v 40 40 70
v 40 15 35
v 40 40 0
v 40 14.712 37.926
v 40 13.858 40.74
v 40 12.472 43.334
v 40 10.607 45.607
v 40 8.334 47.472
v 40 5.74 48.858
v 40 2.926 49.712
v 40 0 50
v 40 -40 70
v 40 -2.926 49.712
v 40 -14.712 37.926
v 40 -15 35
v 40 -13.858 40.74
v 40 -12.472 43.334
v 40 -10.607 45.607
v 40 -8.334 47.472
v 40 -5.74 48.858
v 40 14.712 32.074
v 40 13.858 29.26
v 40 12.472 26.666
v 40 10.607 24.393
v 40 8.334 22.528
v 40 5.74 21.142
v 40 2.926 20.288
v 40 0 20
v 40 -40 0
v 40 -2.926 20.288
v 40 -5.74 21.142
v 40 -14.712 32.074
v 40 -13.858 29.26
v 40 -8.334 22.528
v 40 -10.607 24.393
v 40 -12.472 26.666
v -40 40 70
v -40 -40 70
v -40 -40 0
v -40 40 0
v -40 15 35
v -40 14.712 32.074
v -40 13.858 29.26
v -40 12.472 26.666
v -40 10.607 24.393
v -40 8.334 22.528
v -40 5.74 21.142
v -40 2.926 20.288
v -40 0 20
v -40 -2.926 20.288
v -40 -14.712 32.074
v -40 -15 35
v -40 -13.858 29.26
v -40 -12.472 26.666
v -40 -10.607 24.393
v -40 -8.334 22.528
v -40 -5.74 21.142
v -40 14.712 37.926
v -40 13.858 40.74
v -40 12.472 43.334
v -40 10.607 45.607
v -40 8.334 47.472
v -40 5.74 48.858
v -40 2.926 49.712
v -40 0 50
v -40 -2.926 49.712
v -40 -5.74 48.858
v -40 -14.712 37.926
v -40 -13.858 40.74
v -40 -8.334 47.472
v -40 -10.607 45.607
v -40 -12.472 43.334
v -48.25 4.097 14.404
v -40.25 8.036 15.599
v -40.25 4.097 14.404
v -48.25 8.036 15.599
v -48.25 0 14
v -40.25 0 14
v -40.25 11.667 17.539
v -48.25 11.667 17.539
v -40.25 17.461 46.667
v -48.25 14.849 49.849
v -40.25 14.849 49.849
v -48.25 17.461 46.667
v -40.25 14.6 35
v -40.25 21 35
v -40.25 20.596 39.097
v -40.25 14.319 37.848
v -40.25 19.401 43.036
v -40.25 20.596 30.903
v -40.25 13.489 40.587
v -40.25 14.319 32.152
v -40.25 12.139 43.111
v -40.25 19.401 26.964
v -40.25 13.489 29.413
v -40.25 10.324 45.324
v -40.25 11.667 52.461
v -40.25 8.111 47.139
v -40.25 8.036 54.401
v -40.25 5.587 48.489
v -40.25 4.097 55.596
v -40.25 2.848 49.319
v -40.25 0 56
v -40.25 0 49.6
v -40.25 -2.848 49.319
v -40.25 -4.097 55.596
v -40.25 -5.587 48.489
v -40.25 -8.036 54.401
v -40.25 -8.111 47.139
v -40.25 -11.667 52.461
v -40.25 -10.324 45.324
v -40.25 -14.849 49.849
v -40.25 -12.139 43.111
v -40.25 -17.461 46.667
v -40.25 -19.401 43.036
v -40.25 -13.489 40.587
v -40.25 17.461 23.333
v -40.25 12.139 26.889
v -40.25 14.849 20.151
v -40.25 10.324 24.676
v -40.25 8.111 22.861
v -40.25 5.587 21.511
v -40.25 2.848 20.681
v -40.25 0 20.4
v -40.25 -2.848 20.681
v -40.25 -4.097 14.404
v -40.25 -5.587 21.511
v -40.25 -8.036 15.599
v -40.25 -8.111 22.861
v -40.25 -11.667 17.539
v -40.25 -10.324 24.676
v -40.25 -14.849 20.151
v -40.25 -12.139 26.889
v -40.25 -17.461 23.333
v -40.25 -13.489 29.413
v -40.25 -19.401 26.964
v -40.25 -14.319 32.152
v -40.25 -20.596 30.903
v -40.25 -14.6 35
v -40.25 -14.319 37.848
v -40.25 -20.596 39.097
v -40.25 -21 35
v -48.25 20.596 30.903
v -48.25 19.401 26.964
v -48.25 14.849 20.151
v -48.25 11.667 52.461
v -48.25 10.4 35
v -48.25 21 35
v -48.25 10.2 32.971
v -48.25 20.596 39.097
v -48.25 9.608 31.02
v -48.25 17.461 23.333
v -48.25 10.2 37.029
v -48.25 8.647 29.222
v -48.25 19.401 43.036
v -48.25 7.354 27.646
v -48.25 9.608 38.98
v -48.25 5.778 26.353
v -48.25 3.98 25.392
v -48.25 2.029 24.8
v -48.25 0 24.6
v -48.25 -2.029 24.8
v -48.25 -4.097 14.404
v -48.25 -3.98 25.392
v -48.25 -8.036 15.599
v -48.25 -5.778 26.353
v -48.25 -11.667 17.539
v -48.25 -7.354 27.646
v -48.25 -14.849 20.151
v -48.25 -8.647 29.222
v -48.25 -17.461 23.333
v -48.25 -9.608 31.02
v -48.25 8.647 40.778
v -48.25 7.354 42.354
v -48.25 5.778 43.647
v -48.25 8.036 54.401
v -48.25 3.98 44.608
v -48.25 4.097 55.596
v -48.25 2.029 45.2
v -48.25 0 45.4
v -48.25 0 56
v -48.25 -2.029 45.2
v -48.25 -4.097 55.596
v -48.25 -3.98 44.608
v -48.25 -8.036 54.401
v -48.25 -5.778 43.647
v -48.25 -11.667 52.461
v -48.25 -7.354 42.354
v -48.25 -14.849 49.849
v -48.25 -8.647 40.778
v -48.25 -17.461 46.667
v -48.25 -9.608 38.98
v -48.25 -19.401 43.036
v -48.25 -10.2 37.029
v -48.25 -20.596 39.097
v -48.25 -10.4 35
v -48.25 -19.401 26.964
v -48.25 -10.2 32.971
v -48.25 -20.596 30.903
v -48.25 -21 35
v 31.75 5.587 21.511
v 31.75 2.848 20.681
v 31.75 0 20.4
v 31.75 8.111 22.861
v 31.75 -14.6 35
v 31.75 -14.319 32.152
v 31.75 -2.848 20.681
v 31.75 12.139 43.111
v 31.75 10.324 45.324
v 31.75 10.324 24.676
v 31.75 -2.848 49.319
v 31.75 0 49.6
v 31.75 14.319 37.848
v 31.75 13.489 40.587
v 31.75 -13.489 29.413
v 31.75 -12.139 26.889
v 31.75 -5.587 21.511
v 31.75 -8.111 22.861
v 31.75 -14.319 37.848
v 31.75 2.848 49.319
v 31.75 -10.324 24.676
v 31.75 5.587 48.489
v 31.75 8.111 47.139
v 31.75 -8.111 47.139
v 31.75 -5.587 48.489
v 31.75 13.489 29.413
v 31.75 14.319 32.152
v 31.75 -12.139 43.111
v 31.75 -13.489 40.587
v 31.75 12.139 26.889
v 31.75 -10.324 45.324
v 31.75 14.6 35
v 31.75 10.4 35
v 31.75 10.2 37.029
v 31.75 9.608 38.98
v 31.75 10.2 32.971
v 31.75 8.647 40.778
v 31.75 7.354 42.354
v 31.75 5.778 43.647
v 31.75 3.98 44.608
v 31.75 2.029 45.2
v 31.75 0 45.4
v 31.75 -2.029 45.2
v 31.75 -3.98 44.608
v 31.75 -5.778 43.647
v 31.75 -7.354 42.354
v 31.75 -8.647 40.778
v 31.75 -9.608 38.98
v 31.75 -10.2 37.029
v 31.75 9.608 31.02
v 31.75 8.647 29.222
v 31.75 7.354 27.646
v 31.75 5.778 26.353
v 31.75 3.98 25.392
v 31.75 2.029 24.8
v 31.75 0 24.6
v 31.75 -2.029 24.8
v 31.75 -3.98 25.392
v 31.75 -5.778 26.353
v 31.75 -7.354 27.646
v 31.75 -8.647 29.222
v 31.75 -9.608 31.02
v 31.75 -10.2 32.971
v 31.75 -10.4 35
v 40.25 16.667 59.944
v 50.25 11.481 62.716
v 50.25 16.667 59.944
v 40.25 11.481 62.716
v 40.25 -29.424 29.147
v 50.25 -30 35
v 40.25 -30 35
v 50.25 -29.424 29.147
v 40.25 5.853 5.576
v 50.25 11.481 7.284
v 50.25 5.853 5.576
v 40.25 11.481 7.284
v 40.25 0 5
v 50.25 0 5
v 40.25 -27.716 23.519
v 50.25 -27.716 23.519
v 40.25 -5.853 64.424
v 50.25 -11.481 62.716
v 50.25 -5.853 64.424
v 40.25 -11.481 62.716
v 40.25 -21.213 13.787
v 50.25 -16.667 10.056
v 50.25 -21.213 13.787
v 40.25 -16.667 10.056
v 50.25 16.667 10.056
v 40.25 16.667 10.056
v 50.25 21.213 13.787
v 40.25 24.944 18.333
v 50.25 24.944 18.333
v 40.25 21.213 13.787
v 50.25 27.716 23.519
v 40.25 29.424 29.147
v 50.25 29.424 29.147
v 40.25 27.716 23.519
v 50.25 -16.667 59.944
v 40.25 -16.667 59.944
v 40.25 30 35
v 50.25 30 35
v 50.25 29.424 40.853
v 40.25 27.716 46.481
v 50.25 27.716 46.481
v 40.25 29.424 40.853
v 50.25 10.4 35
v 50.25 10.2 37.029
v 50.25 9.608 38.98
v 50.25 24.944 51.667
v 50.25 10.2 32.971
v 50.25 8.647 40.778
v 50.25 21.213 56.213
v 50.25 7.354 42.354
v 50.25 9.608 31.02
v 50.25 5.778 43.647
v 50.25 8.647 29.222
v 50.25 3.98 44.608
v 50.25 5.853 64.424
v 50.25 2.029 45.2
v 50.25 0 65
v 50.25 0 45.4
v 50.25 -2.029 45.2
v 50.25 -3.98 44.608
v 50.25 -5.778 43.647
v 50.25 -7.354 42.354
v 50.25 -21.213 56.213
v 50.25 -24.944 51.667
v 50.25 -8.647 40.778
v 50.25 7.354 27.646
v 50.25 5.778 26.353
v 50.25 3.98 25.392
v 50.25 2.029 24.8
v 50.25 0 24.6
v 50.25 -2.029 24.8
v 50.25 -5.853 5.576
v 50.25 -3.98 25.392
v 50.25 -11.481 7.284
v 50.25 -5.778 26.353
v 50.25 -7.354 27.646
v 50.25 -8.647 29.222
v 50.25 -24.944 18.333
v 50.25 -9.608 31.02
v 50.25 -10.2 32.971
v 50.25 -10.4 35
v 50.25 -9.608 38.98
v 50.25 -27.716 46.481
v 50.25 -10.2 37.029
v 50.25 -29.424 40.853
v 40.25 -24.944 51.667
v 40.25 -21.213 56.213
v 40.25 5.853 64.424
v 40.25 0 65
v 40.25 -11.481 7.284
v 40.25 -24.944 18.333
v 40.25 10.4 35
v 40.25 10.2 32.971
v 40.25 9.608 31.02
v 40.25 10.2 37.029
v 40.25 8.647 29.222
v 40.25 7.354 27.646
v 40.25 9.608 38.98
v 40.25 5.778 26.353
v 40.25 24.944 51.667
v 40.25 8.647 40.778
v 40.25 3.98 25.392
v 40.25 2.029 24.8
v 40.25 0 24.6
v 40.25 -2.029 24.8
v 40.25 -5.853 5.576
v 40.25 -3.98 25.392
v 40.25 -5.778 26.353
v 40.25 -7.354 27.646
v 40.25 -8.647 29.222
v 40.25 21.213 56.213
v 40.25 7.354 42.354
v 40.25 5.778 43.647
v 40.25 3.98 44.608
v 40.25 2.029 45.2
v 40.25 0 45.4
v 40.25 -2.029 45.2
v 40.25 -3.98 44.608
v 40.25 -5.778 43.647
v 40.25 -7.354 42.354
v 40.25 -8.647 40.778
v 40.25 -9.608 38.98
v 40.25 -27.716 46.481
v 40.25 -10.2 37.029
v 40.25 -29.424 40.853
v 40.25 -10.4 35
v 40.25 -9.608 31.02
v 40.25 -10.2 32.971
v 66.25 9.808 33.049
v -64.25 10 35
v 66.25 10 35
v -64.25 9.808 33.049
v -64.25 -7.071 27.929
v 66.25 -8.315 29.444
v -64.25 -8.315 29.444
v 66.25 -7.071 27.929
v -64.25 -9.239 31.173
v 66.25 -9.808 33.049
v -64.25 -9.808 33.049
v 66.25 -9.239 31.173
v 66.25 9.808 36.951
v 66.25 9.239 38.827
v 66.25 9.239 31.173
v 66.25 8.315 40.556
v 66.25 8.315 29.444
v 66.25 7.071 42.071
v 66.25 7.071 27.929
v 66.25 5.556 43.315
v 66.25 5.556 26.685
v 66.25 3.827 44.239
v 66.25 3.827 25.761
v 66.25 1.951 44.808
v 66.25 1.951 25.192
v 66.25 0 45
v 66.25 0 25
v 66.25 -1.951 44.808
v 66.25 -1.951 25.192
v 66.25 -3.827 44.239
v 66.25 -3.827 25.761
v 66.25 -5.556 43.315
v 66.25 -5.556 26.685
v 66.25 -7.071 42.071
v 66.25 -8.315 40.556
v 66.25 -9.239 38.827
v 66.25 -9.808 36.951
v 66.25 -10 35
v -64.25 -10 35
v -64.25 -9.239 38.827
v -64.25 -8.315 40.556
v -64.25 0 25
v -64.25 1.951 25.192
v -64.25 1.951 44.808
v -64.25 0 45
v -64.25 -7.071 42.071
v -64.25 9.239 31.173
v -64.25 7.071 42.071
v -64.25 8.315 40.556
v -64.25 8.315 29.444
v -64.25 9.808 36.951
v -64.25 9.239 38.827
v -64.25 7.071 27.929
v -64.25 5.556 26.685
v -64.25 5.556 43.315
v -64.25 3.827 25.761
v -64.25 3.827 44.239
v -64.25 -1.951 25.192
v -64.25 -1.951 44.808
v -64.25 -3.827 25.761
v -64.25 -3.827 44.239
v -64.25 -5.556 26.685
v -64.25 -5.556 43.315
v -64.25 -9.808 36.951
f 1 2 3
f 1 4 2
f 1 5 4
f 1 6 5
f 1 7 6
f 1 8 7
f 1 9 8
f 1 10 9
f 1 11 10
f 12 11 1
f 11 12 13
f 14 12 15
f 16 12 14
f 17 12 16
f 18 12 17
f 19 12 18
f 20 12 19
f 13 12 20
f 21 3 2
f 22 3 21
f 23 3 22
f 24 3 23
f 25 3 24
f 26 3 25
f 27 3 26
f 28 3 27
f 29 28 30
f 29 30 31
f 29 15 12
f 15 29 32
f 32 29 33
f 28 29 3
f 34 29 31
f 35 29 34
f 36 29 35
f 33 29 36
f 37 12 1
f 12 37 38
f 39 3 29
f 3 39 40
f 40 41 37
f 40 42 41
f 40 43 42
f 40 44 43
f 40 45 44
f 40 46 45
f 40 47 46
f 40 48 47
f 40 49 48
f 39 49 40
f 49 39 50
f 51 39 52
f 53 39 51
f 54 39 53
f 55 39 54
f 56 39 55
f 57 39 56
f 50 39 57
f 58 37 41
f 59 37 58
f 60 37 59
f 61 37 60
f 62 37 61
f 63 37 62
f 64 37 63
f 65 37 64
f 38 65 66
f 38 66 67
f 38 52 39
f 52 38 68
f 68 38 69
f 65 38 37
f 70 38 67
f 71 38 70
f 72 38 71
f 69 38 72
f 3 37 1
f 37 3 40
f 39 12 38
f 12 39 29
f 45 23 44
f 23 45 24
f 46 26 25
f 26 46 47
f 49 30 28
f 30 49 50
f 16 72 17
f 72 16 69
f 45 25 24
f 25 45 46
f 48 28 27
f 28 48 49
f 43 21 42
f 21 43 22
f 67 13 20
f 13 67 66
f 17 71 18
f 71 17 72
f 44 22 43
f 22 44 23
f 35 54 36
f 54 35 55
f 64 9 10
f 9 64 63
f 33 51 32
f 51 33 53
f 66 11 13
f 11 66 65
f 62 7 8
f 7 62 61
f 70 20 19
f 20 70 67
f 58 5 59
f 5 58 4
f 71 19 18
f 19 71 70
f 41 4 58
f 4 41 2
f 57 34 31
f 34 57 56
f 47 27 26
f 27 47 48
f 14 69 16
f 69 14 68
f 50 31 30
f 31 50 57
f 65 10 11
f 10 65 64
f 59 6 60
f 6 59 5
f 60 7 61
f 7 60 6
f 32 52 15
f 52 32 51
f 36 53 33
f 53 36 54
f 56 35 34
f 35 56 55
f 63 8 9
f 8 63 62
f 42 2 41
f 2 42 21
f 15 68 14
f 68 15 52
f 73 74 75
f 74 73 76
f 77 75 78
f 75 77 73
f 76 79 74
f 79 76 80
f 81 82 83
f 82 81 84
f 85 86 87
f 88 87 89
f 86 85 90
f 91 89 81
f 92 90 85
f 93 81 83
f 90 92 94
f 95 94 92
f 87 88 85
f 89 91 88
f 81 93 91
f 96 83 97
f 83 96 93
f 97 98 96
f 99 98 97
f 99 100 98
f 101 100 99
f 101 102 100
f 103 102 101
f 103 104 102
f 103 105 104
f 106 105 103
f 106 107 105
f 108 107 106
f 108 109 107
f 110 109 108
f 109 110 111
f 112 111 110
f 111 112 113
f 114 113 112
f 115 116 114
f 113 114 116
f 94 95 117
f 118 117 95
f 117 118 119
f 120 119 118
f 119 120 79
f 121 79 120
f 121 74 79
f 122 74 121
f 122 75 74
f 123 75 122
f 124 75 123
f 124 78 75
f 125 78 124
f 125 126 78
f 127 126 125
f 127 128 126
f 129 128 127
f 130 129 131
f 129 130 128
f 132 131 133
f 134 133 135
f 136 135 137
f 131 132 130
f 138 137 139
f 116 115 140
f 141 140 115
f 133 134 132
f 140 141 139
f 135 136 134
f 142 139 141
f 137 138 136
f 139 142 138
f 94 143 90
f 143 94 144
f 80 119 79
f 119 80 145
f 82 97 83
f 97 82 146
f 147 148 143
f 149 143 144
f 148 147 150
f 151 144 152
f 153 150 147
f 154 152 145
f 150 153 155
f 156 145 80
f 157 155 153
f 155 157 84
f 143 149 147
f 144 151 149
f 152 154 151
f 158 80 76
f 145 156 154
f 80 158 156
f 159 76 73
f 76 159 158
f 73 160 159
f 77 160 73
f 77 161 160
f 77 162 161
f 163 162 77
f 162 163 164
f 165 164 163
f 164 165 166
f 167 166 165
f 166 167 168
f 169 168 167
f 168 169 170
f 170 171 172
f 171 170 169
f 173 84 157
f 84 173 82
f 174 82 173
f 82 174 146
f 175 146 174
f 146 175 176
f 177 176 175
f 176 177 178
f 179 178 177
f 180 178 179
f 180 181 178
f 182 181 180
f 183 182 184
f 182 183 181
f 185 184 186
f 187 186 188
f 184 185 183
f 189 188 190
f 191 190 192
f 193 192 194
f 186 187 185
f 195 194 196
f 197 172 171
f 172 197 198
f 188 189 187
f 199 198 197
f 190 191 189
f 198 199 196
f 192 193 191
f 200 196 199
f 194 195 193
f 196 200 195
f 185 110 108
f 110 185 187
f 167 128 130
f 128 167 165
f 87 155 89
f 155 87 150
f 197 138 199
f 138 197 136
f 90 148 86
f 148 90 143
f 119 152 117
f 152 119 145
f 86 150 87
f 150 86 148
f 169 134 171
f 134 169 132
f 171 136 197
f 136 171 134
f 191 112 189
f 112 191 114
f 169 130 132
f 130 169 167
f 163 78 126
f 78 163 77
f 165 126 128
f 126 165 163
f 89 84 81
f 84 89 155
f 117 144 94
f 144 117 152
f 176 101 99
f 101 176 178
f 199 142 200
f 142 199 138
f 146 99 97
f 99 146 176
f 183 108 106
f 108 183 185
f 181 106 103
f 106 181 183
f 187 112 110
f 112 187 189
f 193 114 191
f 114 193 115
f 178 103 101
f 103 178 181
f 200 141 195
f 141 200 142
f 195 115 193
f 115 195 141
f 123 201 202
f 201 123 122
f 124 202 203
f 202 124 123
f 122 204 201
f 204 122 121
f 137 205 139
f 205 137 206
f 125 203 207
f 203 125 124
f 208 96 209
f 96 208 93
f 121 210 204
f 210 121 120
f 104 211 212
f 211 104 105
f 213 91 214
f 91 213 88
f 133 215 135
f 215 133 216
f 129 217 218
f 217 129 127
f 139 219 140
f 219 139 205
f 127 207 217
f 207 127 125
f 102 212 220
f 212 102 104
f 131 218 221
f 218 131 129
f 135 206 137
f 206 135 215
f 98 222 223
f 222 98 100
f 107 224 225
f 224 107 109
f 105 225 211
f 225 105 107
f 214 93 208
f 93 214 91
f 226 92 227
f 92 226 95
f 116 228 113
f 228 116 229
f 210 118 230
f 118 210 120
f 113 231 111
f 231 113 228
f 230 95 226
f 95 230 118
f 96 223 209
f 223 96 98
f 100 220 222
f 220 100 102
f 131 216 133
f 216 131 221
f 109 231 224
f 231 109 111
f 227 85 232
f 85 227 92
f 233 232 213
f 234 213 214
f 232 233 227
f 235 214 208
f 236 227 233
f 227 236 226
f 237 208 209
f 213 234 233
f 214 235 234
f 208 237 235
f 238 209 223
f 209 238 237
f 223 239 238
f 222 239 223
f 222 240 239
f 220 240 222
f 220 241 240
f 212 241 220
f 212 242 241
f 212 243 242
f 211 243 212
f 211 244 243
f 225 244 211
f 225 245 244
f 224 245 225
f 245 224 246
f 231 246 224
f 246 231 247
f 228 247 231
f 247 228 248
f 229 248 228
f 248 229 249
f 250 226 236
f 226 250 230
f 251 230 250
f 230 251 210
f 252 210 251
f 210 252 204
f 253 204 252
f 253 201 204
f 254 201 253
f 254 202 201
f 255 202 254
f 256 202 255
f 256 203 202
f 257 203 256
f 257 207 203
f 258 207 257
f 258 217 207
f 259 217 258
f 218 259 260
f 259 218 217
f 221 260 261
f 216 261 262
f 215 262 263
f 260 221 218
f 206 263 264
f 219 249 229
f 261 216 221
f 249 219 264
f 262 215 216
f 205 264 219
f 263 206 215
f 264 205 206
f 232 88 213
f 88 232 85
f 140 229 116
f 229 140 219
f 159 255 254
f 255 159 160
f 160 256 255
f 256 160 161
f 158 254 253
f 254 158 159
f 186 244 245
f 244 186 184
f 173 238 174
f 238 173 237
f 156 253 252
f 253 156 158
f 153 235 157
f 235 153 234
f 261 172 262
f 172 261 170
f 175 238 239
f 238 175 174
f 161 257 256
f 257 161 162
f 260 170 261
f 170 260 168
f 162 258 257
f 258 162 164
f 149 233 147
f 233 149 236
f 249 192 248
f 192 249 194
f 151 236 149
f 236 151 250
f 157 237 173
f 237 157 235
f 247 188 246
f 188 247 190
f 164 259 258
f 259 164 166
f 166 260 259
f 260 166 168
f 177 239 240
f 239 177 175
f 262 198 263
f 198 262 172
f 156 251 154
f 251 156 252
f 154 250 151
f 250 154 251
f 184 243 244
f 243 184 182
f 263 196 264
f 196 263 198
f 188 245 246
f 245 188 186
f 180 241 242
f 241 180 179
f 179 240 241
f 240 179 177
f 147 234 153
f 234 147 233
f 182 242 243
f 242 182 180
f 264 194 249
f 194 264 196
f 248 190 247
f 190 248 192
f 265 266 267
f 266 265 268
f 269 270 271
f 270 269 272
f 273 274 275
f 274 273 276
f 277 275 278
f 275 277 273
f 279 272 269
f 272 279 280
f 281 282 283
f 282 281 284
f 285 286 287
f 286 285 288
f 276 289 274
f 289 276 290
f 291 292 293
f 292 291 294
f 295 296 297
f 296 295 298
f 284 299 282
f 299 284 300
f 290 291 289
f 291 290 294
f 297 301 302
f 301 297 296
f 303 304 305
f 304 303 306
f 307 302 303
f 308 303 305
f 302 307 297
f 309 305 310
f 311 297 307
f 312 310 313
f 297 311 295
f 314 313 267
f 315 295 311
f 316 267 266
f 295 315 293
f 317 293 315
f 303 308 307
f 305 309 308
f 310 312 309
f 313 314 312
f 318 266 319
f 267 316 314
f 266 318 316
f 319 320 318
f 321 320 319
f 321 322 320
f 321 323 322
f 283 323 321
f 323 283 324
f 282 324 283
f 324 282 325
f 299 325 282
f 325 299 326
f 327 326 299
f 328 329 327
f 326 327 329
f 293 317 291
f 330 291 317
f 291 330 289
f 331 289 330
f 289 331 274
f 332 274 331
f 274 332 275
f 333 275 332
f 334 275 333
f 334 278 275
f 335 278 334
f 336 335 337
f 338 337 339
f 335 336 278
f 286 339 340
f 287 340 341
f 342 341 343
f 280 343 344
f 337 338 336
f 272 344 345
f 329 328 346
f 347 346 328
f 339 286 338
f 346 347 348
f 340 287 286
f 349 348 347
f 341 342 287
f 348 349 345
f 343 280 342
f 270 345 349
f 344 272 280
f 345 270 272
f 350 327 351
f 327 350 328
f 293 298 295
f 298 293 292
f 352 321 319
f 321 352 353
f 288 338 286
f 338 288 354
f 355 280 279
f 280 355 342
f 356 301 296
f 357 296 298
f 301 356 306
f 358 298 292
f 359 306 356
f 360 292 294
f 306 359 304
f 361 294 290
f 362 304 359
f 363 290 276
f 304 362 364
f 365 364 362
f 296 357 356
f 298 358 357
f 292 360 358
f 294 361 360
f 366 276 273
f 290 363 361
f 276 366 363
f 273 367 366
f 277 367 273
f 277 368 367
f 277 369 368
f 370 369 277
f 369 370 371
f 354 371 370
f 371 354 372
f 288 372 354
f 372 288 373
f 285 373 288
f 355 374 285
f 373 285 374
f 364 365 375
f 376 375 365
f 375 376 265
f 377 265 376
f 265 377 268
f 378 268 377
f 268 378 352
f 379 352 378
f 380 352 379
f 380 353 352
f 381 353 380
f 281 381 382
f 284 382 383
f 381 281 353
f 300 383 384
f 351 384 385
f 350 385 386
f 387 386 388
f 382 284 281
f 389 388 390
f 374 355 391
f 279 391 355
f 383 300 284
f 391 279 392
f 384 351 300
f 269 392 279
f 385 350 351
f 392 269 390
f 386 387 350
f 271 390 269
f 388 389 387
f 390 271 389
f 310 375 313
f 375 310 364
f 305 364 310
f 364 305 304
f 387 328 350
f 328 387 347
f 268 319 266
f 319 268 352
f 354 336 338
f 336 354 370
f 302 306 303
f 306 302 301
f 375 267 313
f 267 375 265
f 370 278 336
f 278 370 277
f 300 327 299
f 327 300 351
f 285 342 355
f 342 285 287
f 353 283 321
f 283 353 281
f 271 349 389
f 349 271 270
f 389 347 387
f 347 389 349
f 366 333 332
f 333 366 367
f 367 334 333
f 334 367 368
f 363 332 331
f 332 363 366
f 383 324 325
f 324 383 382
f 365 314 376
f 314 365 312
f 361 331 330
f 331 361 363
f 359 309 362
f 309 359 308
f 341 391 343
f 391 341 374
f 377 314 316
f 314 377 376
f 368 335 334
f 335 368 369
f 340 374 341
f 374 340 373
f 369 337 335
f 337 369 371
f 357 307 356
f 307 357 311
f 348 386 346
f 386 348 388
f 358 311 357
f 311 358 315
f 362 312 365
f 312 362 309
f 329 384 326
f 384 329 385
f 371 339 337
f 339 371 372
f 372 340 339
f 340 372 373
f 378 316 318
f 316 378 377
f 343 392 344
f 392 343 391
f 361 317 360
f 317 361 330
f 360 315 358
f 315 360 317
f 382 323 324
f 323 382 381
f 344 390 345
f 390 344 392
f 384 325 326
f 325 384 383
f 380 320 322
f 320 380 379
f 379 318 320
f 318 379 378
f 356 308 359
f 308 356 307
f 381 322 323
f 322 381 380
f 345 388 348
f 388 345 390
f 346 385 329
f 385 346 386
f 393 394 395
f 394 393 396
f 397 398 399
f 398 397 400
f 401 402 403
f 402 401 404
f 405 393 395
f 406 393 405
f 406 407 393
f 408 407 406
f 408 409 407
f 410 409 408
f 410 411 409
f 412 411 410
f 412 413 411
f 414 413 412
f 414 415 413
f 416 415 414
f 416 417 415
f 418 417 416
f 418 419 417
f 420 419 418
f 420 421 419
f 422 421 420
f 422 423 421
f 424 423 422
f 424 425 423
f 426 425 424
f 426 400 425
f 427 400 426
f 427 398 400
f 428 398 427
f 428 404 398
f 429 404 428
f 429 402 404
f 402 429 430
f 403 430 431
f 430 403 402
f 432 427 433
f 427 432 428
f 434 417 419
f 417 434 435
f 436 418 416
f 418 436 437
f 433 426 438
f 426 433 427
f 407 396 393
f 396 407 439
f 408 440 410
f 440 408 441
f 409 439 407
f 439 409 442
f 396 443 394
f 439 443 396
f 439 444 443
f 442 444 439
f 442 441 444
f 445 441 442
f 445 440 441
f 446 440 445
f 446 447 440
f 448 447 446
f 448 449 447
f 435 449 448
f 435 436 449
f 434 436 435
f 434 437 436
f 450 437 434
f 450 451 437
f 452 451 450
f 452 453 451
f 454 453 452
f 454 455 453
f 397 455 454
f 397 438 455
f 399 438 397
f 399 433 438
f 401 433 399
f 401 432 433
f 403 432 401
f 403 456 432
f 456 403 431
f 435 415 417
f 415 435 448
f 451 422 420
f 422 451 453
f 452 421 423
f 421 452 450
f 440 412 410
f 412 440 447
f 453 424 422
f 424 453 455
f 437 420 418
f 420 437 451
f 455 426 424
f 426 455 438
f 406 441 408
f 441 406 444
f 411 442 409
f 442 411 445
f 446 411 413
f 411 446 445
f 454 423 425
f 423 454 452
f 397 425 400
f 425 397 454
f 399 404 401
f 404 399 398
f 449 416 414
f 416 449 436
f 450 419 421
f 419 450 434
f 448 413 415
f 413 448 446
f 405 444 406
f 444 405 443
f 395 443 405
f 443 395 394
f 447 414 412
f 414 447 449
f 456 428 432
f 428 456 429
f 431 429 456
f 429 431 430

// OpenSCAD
$fn = 32;

// ------------------------------------------------------------------------
// Bushed housing: 80 x 80 x 70 mm housing, bushing d29.2
// Every part is its own module, assembly() places them once.
// ------------------------------------------------------------------------

// --- part 1 ---
module housing() {
  difference() {
    translate([-40, -40, 0]) cube([80, 80, 70]);
    translate([0, 0, 35]) rotate([0, 90, 0]) cylinder(h = 82, d = 30, center = true);
  }
}

// --- part 2 ---
module bushing() {
  difference() {
    union() {
      cylinder(h = 8, d = 42);
      translate([0, 0, 8]) cylinder(h = 72, d = 29.2);
    }
    translate([0, 0, -1]) cylinder(h = 82, d = 20.8);
  }
}

// --- part 3 ---
module shaft() {
  translate([0, 0, -65.25]) cylinder(h = 130.5, d = 20);
}

// --- part 4 ---
module cover() {
  difference() {
    cylinder(h = 10, d = 60);
    translate([0, 0, -1]) cylinder(h = 12, d = 20.8);
  }
}

// --- assembly ---
module assembly() {
  translate([0, 0, 0]) rotate([0, 0, 0]) housing();
  translate([-48.25, 0, 35]) rotate([0, 90, 0]) bushing();
  translate([1, 0, 35]) rotate([0, 90, 0]) shaft();
  translate([40.25, 0, 35]) rotate([0, 90, 0]) cover();
}

assembly();
